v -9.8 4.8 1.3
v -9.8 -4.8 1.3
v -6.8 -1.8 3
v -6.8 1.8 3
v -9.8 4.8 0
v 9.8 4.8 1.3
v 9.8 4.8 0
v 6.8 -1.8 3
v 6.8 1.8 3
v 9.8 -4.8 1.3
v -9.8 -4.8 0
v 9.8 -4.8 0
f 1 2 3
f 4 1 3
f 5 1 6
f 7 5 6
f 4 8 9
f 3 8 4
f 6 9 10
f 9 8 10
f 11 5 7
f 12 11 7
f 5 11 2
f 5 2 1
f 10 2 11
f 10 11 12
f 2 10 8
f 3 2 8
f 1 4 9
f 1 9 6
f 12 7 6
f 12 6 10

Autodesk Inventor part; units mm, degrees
ref_plane "YZ Plane" through (0, 0, 0) normal (1, 0, 0) x (0, 1, 0)
ref_plane "XZ Plane" through (0, 0, 0) normal (0, 1, 0) x (-1, 0, 0)
ref_plane "Work Plane1" through (-273.6, -145.5093, 1.1) normal (0, 0, 1) x (1, 0, 0)
sketch "Sketch1" plane through (0, 0, 0) normal (0, 0, 1) x (1, 0, 0)
  line L0 (-273.6, -142.1074) -> (-273.6, 15) projected
  line L1 (-273.6, -142.1074) -> (-273.5328, -142.3023) projected
  line L2 (-273.5328, -142.3023) -> (-271.5577, -145.5093) projected
  line L3 (-271.5577, -145.5093) -> (27.9577, -145.5093) projected
  line L4 (27.9577, -145.5093) -> (29.9328, -142.3023) projected
  line L5 (29.9328, -142.3023) -> (30, -142.1074) projected
  line L6 (30, -142.1074) -> (30, 15) projected
  line L7 (30, 15) -> (-273.6, 15) projected
  ellipse E0 centre (-207.1368, -126.3725) end of major axis (-207.1368, -124.9133) minor radius 1.45 (-205.7085, -126.6236) -> (-208.5652, -126.6236) ccw projected
  ellipse E1 centre (-207.1368, -126.8715) end of major axis (-205.6868, -126.8715) minor radius 1.4408 (-208.5652, -126.6236) -> (-205.7085, -126.6236) ccw projected
  line L8 (10, -5) -> (-10, -5) projected
  line L9 (-10, -5) -> (-10, 5) projected
  line L10 (-10, 5) -> (10, 5) projected
  line L11 (10, 5) -> (10, -5) projected
  line L12 (-131.8, -134.6879) -> (-131.8, -124.6879) projected
  line L13 (-131.8, -124.6879) -> (-111.8, -124.6879) projected
  line L14 (-111.8, -124.6879) -> (-111.8, -134.6879) projected
  line L15 (-111.8, -134.6879) -> (-131.8, -134.6879) projected
  line L16 (-233.6, -124.6879) -> (-233.6, -134.6879) projected
  line L17 (-233.6, -134.6879) -> (-253.6, -134.6879) projected
  line L18 (-253.6, -134.6879) -> (-253.6, -124.6879) projected
  line L19 (-253.6, -124.6879) -> (-233.6, -124.6879) projected
  line L20 (-131.8, -5) -> (-131.8, 5) projected
  line L21 (-131.8, 5) -> (-111.8, 5) projected
  line L22 (-111.8, 5) -> (-111.8, -5) projected
  line L23 (-111.8, -5) -> (-131.8, -5) projected
  line L24 (-10, -124.6879) -> (10, -124.6879) projected
  line L25 (10, -124.6879) -> (10, -134.6879) projected
  line L26 (10, -134.6879) -> (-10, -134.6879) projected
  line L27 (-10, -134.6879) -> (-10, -124.6879) projected
  line L28 (-233.6, 5) -> (-233.6, -5) projected
  line L29 (-233.6, -5) -> (-253.6, -5) projected
  line L30 (-253.6, -5) -> (-253.6, 5) projected
  line L31 (-253.6, 5) -> (-233.6, 5) projected
  ellipse E2 centre (-268.2527, 10.0167) end of major axis (-268.2527, 11.4759) minor radius 1.45 (-266.8028, 9.9997) -> (-269.7026, 9.9997) ccw projected
  ellipse E3 centre (-268.2527, 9.9828) end of major axis (-268.2527, 8.5236) minor radius 1.45 (-269.7026, 9.9997) -> (-266.8028, 9.9997) ccw projected
  ellipse E4 centre (25.0696, -126.3725) end of major axis (25.0696, -124.9133) minor radius 1.45 (26.5195, -126.3895) -> (23.6197, -126.3895) ccw projected
  ellipse E5 centre (25.0696, -126.4064) end of major axis (25.0696, -127.8656) minor radius 1.45 (23.6197, -126.3895) -> (26.5195, -126.3895) ccw projected
  ellipse E6 centre (-268.2527, -58.2135) end of major axis (-268.2527, -56.7542) minor radius 1.45 (-266.8028, -58.2304) -> (-269.7026, -58.2304) ccw projected
  ellipse E7 centre (-268.2527, -58.2474) end of major axis (-268.2527, -59.7066) minor radius 1.45 (-269.7026, -58.2304) -> (-266.8028, -58.2304) ccw projected
  ellipse E8 centre (-83.992, 10.0167) end of major axis (-83.992, 11.4759) minor radius 1.45 (-82.5421, 9.9997) -> (-85.4419, 9.9997) ccw projected
  ellipse E9 centre (-83.992, 9.9828) end of major axis (-83.992, 8.5236) minor radius 1.45 (-85.4419, 9.9997) -> (-82.5421, 9.9997) ccw projected
  ellipse E10 centre (25.0696, -58.2135) end of major axis (25.0696, -56.7542) minor radius 1.45 (26.5195, -58.2304) -> (23.6197, -58.2304) ccw projected
  ellipse E11 centre (25.0696, -58.2474) end of major axis (25.0696, -59.7066) minor radius 1.45 (23.6197, -58.2304) -> (26.5195, -58.2304) ccw projected
  ellipse E12 centre (-62.1557, -126.3725) end of major axis (-62.1557, -124.9133) minor radius 1.45 (-60.7058, -126.3895) -> (-63.6056, -126.3895) ccw projected
  ellipse E13 centre (-62.1557, -126.4064) end of major axis (-62.1557, -127.8656) minor radius 1.45 (-63.6056, -126.3895) -> (-60.7058, -126.3895) ccw projected
  ellipse E14 centre (-268.2527, -126.3725) end of major axis (-268.2527, -124.9133) minor radius 1.45 (-266.8028, -126.3895) -> (-269.7026, -126.3895) ccw projected
  ellipse E15 centre (-268.2527, -126.4064) end of major axis (-268.2527, -127.8656) minor radius 1.45 (-269.7026, -126.3895) -> (-266.8028, -126.3895) ccw projected
  ellipse E16 centre (-167.7791, 10.0167) end of major axis (-167.7791, 11.4759) minor radius 1.45 (-166.3292, 9.9997) -> (-169.229, 9.9997) ccw projected
  ellipse E17 centre (-167.7791, 9.9828) end of major axis (-167.7791, 8.5236) minor radius 1.45 (-169.229, 9.9997) -> (-166.3292, 9.9997) ccw projected
  ellipse E18 centre (-151.1416, -126.3725) end of major axis (-151.1416, -124.9133) minor radius 1.45 (-149.7132, -126.6236) -> (-152.5699, -126.6236) ccw projected
  ellipse E19 centre (-151.1416, -126.8715) end of major axis (-149.6916, -126.8715) minor radius 1.4408 (-152.5699, -126.6236) -> (-149.7132, -126.6236) ccw projected
  ellipse E20 centre (25.0696, 10.0167) end of major axis (25.0696, 11.4759) minor radius 1.45 (26.5195, 9.9997) -> (23.6197, 9.9997) ccw projected
  ellipse E21 centre (25.0696, 9.9828) end of major axis (25.0696, 8.5236) minor radius 1.45 (23.6197, 9.9997) -> (26.5195, 9.9997) ccw projected
  line L32 (-9.8, 4.8) -> (9.8, 4.8)
  line L33 (9.8, 4.8) -> (9.8, -4.8)
  line L34 (9.8, -4.8) -> (-9.8, -4.8)
  line L35 (-9.8, -4.8) -> (-9.8, 4.8)
  line L36 (-6.8, 1.8) -> (6.8, 1.8)
  line L37 (6.8, 1.8) -> (6.8, -1.8)
  line L38 (6.8, -1.8) -> (-6.8, -1.8)
  line L39 (-6.8, -1.8) -> (-6.8, 1.8)
  point P0 (0, 0)
  point P1 (0, 0)
  point P2 (-121.8, 0)
  point P3 (-243.6, 0)
  point P4 (-243.6, -129.6879)
  point P5 (-121.8, -129.6879)
  point P6 (0, -129.6879)
  point P7 (0, 0)
  dimension "d0" = 19.6
  dimension "d1" = 9.6
  dimension "d2" = 13.6
  dimension "d3" = 3.6
extrude "Extrusion1" add sketch "Sketch1" along normal blind 1.3 contours L32 L33 L34 L35 | L36 L37 L38 L39
sketch "Sketch2" plane through (0, 0, 1.3) normal (0, 0, 1) x (1, 0, 0)
  line L0 (-6.8, 1.8) -> (6.8, 1.8)
  line L1 (6.8, 1.8) -> (6.8, -1.8)
  line L2 (6.8, -1.8) -> (-6.8, -1.8)
  line L3 (-6.8, -1.8) -> (-6.8, 1.8)
  point P0 (0, 0)
  point P1 (0, 0)
  dimension "d6" = 13.6
  dimension "d7" = 3.6
extrude "Extrusion2" add sketch "Sketch2" along normal blind 1.7
sketch "Sketch3" plane through (-9.8, -4.8, 0) normal (0, -1, 0) x (1, 0, 0)
  line L0 (16.6, 3) -> (3, 3) projected
  line L1 (0, 1.3) -> (3, 3)
  line L2 (3, 3) -> (16.6, 3)
  line L3 (19.6, 1.3) -> (0, 1.3) projected
  line L4 (16.6, 3) -> (19.6, 1.3)
  line L5 (0, 0) -> (0, 1.3) projected
  line L6 (19.6, 1.3) -> (0, 1.3)
  point P0 (9.8, 0)
extrude "Extrusion3" add sketch "Sketch3" against normal up to surface (9.6 mm away)
sketch "Sketch4" plane through (9.8, -4.8, 0) normal (1, 0, 0) x (0, 0, -1)
  line L0 (0, 0) -> (-1.3, 0) projected
  line L1 (-1.3, 0) -> (-1.3, 3)
  line L2 (-1.3, 9.6) -> (-1.3, 0) projected
  line L3 (0, 9.6) -> (-1.3, 9.6) projected
  line L4 (-1.3, 9.6) -> (-1.3, 6.6)
  line L5 (-1.3, 0) -> (-3, 3)
  line L6 (-3, 0) -> (-3, 9.6) projected
  line L7 (-3, 6.6) -> (-1.3, 9.6)
  line L8 (-3, 0) -> (-1.3, 0) projected
  line L9 (-1.3, 0) -> (-3, 0)
  line L10 (-3, 0) -> (-3, 9.6)
  line L11 (-3, 9.6) -> (-1.3, 9.6) projected
  line L12 (-3, 9.6) -> (-1.3, 9.6)
  point P0 (0, 4.8)
  dimension "d12" = 3
  dimension "d13" = 3
extrude "Extrusion4" cut sketch "Sketch4" against normal through all contours L8 L6 L5 | L6 L11 L7
properties part number "Pads"
